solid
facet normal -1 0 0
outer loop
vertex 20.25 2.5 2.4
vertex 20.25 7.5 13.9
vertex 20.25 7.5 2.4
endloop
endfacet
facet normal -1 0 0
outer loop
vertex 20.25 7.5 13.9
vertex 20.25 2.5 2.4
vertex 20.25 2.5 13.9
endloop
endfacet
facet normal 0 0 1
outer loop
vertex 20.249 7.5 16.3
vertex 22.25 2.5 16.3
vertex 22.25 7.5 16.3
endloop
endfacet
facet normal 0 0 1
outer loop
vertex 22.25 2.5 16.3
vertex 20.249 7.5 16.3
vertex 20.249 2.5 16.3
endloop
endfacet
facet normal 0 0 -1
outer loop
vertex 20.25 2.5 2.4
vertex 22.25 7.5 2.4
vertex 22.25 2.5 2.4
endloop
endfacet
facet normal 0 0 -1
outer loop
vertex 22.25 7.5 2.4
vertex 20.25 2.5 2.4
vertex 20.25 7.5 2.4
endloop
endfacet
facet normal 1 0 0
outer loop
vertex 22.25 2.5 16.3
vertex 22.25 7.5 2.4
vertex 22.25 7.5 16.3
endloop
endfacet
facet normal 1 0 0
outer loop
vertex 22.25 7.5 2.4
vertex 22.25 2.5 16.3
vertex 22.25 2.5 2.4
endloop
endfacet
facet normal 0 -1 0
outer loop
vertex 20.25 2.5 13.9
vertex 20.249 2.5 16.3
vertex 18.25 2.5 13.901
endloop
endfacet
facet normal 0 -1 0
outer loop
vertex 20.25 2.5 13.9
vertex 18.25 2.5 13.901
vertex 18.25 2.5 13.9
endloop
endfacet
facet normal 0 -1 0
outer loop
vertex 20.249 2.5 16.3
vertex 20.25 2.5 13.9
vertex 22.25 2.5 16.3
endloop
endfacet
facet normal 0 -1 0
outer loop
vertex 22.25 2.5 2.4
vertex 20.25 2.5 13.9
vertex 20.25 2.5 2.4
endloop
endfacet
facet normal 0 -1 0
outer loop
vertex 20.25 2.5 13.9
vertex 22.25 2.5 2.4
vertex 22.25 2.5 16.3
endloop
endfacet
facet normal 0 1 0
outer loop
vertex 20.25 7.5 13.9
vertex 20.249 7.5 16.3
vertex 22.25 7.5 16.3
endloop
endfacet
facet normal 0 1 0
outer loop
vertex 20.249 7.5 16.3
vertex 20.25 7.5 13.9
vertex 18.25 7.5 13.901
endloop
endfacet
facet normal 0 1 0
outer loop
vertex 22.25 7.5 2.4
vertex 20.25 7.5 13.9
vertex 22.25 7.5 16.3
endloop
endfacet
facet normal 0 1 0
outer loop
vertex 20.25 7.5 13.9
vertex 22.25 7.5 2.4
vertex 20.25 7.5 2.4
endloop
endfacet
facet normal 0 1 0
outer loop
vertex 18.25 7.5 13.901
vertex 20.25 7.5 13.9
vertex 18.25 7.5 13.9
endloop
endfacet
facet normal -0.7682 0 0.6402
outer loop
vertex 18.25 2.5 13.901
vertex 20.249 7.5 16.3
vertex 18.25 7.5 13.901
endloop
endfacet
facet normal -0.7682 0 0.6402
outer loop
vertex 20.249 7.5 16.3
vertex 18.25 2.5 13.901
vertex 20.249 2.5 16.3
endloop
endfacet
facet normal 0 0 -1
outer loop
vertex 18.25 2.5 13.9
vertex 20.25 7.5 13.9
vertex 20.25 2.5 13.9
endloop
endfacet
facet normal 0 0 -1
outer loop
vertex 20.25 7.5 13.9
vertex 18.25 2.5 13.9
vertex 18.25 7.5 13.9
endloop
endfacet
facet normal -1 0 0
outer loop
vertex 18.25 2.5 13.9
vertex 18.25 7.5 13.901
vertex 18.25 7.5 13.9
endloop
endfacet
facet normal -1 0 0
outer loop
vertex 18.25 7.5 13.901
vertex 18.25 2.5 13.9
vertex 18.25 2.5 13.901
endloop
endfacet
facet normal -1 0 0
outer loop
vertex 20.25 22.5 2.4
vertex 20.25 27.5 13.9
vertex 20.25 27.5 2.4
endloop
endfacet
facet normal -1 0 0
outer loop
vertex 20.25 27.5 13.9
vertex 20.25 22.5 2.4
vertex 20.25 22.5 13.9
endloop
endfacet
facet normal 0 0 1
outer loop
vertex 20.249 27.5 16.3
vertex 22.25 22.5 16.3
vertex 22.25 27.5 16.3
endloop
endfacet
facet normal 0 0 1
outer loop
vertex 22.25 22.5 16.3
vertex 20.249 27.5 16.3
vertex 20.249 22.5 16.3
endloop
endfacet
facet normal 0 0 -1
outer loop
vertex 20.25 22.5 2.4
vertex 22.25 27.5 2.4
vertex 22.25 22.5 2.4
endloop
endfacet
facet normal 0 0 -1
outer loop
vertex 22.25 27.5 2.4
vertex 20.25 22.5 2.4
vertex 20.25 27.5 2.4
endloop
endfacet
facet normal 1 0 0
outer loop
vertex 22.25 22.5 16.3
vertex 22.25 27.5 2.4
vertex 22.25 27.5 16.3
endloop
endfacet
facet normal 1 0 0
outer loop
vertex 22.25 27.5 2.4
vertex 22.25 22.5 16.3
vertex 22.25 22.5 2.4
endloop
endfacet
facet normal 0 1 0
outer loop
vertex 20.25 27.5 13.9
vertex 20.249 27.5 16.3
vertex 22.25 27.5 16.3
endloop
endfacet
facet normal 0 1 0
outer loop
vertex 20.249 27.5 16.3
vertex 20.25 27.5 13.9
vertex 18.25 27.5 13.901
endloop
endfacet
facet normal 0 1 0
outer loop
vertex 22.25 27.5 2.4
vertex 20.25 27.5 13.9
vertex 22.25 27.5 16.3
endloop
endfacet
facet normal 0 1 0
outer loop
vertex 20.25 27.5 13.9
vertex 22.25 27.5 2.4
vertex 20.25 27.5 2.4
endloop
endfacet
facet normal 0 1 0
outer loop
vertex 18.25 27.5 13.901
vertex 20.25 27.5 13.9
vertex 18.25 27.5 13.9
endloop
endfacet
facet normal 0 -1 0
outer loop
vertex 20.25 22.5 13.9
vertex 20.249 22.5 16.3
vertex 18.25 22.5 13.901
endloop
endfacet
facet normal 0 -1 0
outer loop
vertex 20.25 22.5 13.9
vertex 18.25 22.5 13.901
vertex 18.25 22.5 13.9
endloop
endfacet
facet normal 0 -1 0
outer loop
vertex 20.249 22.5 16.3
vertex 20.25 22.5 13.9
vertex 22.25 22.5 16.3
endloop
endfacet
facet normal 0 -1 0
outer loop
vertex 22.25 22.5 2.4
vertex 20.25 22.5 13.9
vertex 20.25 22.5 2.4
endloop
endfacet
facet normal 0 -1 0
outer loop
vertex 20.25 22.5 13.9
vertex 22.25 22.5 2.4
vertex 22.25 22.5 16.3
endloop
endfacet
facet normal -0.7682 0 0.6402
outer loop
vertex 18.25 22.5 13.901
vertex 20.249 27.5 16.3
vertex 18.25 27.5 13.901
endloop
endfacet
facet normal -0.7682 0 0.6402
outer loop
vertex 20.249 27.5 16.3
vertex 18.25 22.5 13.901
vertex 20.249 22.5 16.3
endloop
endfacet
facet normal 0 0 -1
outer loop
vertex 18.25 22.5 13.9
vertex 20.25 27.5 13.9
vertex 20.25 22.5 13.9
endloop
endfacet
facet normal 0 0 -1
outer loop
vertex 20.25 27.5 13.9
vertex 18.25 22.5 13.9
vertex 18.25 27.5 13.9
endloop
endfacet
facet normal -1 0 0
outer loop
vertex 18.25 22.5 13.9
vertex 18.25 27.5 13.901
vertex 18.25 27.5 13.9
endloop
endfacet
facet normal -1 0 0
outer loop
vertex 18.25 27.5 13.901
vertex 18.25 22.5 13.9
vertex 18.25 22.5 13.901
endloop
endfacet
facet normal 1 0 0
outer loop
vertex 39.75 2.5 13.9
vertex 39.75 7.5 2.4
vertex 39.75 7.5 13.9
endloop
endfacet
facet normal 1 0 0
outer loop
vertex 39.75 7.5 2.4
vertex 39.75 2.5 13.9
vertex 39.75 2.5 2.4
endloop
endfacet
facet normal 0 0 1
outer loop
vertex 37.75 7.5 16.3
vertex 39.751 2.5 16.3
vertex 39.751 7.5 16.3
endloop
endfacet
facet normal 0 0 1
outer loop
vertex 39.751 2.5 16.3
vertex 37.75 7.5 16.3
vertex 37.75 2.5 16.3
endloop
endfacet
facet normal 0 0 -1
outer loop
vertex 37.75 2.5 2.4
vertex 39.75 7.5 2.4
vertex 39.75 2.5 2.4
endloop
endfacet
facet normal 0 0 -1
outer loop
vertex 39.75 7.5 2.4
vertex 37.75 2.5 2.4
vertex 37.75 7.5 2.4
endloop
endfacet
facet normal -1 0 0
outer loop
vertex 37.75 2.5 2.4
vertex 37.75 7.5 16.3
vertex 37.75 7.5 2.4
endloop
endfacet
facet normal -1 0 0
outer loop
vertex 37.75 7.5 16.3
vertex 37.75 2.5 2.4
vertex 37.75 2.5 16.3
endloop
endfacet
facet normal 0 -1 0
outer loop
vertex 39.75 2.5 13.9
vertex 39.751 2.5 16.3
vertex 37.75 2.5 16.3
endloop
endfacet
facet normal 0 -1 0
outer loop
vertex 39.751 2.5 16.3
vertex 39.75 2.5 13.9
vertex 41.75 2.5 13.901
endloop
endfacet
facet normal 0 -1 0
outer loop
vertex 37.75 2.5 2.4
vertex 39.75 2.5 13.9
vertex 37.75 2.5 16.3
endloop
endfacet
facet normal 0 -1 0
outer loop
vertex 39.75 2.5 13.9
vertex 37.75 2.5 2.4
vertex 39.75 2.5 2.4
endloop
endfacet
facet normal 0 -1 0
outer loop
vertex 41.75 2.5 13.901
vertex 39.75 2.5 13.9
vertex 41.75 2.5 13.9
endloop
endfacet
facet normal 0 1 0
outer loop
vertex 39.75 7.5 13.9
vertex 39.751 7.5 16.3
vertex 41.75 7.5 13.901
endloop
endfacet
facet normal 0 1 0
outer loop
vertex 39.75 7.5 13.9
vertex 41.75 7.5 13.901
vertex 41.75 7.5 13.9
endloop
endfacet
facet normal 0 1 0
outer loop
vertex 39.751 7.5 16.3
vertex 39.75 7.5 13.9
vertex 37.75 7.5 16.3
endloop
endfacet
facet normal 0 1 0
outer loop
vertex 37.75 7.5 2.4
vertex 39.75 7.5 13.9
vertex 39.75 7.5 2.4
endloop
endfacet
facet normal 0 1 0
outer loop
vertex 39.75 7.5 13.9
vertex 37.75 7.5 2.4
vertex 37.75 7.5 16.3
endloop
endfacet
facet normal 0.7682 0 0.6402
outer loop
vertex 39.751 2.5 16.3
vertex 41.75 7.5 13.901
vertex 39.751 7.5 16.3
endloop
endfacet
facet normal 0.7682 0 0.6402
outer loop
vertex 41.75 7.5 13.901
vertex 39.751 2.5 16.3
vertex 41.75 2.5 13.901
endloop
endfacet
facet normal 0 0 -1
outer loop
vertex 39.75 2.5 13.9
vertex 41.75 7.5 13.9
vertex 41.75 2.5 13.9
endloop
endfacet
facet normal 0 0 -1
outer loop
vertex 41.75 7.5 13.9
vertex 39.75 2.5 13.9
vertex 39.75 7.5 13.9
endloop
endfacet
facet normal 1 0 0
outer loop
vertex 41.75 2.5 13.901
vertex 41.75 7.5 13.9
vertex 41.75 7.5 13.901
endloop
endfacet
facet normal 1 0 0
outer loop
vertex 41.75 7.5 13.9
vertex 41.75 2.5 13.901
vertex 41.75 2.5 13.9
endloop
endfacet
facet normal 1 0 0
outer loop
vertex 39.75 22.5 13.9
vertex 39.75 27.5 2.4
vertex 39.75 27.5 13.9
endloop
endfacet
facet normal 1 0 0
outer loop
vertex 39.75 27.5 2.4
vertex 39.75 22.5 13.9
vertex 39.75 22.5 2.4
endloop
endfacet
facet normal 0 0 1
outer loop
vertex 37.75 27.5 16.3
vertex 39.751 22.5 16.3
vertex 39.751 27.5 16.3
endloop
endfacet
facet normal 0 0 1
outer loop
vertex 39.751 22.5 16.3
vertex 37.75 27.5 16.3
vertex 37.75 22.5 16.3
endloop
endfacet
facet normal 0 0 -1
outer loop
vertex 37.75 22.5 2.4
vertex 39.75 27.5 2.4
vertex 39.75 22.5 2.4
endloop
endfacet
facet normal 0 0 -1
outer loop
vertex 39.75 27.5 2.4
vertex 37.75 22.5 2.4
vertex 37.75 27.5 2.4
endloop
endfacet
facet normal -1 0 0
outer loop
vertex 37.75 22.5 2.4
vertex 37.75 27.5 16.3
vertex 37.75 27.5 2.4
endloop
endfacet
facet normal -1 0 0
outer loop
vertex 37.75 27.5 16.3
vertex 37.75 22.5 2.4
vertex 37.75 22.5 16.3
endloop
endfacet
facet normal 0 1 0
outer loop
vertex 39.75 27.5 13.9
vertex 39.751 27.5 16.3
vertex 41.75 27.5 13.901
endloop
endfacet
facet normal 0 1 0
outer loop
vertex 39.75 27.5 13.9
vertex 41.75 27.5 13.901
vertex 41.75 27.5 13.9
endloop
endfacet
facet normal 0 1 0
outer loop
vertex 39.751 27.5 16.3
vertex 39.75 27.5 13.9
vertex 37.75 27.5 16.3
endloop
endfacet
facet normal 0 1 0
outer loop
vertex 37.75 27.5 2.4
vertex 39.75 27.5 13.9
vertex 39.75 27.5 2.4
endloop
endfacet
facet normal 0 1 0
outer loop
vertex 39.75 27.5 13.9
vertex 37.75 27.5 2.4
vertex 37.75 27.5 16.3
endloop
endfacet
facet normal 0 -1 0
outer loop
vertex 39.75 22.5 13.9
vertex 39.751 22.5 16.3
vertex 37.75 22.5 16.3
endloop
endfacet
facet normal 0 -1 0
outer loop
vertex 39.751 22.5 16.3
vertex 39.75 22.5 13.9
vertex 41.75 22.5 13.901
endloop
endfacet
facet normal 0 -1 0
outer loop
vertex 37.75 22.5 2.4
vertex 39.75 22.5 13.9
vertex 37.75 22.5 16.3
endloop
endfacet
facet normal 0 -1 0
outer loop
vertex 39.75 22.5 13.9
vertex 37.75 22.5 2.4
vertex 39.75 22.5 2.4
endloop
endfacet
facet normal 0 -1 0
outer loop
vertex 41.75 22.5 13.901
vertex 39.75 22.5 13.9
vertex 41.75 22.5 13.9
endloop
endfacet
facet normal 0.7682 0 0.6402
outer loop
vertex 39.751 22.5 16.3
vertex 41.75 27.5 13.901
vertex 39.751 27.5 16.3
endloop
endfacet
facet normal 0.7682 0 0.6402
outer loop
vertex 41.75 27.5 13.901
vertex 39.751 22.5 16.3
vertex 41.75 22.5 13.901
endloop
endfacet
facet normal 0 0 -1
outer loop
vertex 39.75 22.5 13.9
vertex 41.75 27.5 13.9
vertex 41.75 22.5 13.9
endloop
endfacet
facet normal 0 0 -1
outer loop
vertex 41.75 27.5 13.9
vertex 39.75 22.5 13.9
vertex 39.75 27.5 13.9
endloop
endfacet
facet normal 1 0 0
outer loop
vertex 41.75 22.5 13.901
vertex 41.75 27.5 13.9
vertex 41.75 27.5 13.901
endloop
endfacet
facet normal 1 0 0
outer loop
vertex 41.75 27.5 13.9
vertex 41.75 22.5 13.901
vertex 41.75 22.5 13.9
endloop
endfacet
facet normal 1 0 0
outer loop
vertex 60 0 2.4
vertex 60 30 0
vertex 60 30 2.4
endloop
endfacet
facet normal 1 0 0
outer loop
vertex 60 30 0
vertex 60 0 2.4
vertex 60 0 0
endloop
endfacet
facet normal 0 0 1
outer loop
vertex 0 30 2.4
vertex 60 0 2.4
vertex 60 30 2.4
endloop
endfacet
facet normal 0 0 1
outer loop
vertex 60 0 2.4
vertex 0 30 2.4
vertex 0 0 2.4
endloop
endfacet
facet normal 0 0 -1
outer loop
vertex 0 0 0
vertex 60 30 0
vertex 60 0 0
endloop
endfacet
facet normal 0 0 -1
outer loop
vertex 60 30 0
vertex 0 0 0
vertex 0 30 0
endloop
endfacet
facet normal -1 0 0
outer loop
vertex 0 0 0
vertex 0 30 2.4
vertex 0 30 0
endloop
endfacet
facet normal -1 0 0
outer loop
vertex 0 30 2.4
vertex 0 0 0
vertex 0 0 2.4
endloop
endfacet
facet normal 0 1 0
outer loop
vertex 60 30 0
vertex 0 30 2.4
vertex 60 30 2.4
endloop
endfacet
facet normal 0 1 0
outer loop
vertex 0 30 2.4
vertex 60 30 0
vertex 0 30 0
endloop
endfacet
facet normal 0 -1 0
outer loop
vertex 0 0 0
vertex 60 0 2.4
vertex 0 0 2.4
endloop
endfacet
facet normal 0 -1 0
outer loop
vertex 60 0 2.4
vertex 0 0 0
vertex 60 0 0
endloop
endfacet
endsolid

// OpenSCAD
space_w = 19.5;
space_h = 25.0;

panel_w = 60.0;
panel_h = 30.0;
panel_d = 2.4;
// outer width 42

clip_w = 2.0;
clip_h = 5.0;
clip_d = 11.5;

%translate([panel_w/2, panel_h/2, panel_d+clip_d]) {
  difference() {
    translate([-panel_w/2, -panel_h/2, -2])
      cube([panel_w, panel_h, 2]);
    translate([-space_w/2, -space_h/2, -2.01])
      cube([space_w, space_h, 2.02]);
  }
}

module clip(w, h, d) {
  end_w = 2.0;
  end_d = 2.4;

  union() {
    cube([w, h, d+end_d]);
    hull() {
      translate([w, 0, d]) {
        // flat
        cube([end_w, h, 0.001]);
        // upright
        cube([0.001, h, end_d]);
      }
    }
  }
}

module clip4(x_from_center=space_w/2, y_from_center=space_h/2) {
  for (x=[-1,1])
    for (y=[-1,1])
      scale([x, y, 1])
        translate([x_from_center-clip_w, y_from_center-clip_h])
          clip(clip_w, clip_h, clip_d);
}

union() {
  cube([panel_w, panel_h, panel_d]);

  translate([panel_w/2, panel_h/2, panel_d])
    clip4();
}
